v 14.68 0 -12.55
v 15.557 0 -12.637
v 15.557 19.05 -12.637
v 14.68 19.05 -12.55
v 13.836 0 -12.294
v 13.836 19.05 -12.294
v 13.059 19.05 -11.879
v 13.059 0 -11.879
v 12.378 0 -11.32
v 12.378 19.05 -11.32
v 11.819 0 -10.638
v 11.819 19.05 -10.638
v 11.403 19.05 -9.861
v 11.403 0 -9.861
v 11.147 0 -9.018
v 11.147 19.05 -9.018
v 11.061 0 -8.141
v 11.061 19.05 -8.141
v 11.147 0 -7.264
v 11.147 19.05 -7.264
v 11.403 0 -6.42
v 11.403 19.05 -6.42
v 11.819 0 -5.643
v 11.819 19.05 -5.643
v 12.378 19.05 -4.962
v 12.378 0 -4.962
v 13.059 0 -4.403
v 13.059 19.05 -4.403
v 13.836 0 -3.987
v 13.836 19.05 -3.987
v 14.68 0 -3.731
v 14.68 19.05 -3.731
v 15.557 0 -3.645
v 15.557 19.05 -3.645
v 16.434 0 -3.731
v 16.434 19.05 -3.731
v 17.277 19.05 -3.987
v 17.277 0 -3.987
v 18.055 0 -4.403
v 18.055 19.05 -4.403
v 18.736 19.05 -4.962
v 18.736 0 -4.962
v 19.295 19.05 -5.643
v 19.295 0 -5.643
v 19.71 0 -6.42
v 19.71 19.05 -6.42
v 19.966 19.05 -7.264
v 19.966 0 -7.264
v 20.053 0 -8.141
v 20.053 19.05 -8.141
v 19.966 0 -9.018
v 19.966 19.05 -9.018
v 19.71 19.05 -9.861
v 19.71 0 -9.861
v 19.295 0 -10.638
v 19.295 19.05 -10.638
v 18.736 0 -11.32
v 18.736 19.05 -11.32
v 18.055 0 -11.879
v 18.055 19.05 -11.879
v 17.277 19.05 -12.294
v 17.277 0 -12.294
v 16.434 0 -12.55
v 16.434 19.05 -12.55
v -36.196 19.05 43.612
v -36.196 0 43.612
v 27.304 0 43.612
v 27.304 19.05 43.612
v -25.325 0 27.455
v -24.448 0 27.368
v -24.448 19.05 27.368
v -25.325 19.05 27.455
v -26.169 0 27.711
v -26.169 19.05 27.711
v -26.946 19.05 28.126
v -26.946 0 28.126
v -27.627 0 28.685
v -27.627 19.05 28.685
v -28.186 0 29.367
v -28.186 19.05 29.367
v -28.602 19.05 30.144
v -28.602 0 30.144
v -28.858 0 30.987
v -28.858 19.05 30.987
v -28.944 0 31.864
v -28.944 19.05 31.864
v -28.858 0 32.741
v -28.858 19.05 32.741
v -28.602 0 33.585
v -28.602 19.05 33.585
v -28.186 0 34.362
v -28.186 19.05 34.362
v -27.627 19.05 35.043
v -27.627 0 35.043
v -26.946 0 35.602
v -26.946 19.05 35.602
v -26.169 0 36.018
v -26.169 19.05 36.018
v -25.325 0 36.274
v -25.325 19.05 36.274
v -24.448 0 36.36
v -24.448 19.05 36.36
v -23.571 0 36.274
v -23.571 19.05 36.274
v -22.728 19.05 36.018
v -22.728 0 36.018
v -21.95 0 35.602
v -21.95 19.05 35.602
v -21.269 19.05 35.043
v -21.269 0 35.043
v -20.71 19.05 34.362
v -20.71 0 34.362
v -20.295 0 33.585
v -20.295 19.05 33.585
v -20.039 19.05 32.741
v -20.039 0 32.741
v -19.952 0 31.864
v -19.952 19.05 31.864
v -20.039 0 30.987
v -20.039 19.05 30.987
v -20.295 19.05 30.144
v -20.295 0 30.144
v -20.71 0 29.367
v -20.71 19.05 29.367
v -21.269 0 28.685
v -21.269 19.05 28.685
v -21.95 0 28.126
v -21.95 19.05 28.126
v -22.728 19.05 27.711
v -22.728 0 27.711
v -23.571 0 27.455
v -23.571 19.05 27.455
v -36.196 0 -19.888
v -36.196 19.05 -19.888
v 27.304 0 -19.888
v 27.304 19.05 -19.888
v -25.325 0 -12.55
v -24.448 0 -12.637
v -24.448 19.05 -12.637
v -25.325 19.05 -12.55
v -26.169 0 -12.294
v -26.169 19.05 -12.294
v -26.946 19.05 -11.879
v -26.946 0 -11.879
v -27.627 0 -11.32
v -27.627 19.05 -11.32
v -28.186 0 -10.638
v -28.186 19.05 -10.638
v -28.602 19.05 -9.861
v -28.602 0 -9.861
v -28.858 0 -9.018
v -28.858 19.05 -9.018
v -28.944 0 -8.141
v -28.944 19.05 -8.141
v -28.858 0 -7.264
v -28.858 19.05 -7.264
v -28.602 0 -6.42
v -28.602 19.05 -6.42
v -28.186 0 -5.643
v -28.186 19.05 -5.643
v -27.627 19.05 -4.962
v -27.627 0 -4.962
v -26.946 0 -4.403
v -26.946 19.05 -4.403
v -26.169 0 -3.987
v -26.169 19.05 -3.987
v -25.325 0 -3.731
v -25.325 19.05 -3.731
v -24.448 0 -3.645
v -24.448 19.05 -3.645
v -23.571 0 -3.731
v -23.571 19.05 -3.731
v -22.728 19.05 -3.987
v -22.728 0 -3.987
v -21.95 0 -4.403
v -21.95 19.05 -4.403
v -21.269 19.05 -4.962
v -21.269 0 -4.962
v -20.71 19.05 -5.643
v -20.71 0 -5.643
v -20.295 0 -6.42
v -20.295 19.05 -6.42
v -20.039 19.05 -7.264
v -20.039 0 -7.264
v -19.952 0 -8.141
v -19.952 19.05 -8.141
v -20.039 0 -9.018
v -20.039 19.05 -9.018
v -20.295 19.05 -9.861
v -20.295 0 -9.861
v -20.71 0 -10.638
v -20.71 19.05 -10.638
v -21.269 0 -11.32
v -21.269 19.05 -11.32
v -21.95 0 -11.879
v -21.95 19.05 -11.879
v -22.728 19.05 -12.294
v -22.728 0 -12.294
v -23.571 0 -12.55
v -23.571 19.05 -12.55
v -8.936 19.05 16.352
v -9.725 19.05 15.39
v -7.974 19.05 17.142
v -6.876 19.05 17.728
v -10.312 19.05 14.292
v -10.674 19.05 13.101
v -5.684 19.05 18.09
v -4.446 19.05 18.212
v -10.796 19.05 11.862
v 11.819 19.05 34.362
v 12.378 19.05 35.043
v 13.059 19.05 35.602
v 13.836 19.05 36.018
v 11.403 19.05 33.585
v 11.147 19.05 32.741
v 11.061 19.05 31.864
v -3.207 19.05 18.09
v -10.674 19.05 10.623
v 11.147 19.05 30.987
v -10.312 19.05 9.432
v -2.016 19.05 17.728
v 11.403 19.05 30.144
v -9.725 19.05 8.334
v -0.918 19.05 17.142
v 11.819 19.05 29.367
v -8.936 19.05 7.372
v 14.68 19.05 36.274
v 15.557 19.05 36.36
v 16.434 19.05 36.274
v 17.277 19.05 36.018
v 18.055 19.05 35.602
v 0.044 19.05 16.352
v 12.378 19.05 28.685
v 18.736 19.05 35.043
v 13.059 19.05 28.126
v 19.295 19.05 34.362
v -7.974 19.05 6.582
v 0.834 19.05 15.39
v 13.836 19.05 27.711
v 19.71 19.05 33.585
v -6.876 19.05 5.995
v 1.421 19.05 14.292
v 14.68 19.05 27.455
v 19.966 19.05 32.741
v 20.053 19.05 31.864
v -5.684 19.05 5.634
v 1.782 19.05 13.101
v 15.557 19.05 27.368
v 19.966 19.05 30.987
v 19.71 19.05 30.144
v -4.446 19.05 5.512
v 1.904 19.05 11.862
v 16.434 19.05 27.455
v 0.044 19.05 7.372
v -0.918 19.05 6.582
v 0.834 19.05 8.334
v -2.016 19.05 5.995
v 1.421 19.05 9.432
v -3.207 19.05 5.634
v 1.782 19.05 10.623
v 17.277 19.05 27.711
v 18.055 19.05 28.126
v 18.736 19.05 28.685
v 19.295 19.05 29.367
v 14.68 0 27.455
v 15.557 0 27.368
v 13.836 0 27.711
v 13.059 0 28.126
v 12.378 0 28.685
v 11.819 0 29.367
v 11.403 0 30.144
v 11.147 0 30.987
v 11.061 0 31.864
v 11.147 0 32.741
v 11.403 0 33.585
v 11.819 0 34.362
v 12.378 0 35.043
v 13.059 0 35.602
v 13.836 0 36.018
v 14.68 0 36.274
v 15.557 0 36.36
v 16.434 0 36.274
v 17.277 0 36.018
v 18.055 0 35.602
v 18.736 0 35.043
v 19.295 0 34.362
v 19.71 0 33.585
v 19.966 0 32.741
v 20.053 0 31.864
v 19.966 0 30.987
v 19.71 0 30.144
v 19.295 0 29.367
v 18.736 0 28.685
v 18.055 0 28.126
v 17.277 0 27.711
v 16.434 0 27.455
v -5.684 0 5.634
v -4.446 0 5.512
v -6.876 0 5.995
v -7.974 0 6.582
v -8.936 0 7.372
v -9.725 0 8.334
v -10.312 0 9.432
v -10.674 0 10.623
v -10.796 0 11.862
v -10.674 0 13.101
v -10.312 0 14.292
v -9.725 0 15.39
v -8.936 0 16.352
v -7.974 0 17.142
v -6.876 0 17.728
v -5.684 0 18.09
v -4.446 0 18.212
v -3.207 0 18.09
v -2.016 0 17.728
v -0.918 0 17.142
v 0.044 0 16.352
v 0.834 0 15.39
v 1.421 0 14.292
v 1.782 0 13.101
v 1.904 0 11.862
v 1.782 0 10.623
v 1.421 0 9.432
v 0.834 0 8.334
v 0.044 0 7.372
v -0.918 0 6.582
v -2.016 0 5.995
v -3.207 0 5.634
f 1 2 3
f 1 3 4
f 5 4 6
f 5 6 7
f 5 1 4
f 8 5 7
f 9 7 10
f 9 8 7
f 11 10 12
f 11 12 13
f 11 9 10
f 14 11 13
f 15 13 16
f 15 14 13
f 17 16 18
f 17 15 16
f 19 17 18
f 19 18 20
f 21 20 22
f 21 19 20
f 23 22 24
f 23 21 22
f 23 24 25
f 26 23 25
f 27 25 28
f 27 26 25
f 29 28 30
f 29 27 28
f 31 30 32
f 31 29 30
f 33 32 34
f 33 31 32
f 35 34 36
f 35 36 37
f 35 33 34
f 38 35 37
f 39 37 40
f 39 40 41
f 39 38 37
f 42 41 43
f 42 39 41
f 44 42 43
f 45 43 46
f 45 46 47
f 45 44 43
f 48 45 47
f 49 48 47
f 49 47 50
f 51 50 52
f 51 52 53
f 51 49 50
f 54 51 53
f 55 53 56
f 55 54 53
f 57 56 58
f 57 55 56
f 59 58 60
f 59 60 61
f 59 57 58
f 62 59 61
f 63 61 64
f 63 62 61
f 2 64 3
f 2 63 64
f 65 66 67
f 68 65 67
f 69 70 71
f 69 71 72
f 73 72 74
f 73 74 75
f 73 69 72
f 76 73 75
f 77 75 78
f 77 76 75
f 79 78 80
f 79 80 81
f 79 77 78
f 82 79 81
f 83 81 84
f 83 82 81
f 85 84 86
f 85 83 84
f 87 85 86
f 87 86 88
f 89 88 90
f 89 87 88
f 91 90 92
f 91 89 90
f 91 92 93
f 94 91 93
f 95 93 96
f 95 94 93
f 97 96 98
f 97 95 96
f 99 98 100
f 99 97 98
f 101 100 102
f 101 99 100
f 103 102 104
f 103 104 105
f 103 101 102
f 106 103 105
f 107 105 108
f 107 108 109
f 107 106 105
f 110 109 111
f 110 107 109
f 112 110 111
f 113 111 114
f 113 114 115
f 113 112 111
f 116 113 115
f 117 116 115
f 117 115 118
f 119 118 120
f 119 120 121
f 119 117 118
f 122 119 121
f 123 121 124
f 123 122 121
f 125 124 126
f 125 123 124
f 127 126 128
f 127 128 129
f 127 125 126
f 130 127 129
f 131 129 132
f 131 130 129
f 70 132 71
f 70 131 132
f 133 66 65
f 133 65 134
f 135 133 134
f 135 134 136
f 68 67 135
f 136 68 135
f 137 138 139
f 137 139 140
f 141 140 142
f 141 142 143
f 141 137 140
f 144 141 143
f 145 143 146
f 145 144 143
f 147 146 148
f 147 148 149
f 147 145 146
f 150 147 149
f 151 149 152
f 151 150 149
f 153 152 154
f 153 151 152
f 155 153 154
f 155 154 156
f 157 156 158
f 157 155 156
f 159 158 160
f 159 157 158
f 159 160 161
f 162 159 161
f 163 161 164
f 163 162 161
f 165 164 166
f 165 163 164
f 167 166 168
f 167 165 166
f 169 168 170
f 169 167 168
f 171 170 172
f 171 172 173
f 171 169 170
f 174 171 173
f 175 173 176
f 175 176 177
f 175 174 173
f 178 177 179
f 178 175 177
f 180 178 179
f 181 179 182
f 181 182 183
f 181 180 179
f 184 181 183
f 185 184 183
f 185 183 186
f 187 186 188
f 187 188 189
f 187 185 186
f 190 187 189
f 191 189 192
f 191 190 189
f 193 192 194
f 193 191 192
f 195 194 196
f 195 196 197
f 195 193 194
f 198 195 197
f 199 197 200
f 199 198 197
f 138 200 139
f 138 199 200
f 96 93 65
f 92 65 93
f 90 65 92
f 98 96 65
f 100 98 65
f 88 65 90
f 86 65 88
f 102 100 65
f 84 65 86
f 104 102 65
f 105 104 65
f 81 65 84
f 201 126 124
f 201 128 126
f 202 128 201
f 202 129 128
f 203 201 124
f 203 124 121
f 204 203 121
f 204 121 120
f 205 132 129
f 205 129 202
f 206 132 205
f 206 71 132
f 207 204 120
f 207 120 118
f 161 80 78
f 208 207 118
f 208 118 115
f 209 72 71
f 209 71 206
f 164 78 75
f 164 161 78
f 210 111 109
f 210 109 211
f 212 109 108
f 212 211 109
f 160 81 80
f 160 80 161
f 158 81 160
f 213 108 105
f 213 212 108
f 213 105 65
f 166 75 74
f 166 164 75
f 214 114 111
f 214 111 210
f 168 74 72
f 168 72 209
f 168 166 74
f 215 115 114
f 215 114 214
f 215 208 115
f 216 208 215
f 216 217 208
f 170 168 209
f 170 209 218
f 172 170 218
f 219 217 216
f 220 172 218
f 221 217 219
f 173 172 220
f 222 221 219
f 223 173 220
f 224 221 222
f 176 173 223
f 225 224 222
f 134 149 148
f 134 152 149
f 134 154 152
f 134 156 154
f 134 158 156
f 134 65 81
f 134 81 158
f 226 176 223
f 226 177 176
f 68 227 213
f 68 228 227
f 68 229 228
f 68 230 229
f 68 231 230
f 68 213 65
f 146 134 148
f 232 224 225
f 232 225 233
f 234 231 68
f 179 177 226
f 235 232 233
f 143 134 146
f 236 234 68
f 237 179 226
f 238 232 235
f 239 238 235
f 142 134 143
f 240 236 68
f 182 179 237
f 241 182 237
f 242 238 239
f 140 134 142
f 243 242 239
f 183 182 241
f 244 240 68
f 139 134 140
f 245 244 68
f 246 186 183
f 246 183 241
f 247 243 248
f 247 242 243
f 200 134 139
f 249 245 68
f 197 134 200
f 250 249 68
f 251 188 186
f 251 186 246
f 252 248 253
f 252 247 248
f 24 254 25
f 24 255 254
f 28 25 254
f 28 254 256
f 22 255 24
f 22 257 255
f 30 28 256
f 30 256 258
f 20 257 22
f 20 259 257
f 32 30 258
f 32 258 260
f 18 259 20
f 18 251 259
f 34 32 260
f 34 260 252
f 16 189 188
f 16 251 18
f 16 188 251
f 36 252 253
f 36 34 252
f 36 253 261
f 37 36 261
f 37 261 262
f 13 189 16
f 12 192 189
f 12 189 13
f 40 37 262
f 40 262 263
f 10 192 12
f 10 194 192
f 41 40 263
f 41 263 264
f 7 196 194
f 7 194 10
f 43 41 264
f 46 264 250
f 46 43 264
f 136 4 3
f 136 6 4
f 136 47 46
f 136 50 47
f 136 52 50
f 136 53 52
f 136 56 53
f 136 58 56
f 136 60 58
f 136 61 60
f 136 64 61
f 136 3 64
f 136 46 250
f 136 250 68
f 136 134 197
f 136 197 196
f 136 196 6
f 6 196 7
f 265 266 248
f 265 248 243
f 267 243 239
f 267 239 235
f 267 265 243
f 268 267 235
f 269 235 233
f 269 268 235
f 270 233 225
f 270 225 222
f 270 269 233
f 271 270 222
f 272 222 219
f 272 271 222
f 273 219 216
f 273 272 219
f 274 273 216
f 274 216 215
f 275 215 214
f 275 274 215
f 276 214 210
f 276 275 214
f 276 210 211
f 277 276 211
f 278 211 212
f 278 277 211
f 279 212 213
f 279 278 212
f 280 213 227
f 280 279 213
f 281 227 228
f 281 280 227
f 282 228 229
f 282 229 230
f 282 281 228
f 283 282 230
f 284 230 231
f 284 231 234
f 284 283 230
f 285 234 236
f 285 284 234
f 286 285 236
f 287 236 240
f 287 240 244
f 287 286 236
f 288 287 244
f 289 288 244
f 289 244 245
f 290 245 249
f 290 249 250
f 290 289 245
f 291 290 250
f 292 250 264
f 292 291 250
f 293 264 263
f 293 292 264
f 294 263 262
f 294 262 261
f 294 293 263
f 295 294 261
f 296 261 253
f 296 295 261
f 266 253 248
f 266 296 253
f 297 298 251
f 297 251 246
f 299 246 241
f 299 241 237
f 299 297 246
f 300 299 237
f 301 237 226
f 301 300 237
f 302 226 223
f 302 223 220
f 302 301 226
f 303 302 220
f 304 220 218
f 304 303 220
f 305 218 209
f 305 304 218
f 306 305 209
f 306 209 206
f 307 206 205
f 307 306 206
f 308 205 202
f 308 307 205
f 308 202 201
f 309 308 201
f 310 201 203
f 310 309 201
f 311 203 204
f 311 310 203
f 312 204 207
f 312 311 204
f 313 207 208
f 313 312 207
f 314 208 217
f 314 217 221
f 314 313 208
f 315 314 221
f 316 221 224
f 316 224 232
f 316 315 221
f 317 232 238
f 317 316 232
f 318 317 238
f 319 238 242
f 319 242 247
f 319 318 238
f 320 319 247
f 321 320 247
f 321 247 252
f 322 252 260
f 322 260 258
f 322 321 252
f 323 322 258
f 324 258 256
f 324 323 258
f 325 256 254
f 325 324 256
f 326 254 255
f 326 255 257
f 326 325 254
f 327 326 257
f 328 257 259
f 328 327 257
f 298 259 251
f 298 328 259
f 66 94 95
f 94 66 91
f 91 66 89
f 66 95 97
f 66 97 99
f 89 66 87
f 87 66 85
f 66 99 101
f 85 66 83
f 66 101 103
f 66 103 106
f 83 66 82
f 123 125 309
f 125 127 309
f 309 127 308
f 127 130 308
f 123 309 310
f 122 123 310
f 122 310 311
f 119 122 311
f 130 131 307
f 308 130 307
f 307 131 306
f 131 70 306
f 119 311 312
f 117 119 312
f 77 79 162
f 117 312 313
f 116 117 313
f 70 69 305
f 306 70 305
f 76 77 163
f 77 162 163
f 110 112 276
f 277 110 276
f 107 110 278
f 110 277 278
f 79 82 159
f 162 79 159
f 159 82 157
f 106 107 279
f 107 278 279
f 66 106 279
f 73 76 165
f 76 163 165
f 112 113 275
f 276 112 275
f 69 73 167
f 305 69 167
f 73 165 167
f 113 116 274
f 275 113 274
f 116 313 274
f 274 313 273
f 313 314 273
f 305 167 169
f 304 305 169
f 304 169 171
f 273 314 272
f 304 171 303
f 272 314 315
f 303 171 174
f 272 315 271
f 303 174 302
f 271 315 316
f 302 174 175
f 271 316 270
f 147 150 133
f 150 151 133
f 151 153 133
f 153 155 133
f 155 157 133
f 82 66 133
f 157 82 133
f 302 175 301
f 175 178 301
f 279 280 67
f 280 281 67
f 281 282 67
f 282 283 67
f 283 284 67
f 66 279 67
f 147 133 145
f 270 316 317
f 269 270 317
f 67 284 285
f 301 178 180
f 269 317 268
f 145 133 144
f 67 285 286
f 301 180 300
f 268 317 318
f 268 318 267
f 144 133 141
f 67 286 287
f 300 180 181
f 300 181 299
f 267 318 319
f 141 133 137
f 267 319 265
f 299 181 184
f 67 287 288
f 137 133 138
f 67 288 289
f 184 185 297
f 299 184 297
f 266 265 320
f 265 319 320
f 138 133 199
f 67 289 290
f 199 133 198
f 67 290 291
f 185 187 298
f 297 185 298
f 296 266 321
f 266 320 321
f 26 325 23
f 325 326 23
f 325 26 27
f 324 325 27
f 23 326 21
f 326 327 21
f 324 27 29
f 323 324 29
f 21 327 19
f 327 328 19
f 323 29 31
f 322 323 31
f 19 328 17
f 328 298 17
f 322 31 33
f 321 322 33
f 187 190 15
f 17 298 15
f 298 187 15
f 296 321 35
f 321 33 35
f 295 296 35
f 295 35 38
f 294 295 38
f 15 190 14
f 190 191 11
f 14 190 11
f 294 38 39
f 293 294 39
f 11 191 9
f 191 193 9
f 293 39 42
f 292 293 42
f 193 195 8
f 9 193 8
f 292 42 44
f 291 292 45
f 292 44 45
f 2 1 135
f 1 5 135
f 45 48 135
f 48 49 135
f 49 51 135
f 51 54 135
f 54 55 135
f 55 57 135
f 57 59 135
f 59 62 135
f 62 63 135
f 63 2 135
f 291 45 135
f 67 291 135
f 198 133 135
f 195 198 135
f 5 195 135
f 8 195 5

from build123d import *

# Parameters (mm, degrees)
SKETCH1_W           = 63.5
SKETCH1_H           = 63.5
SKETCH1_R           = 6.35
BOSS_EXTRUDE1_DEPTH = 19.05
SKETCH3_R           = 4.4958
CUT_EXTRUDE2_DEPTH  = 19.05


with BuildPart() as part:
    # Sketch1 → Boss-Extrude1 (new body)
    with BuildSketch(Plane(origin=(0, 0, 0), x_dir=(1, 0, 0), z_dir=(0, 1, 0))):
        with Locations((-4.445666472, -11.8618)):
            Rectangle(SKETCH1_W, SKETCH1_H)
        with Locations(Location((-4.445666472, -11.8618, 0), (0, 0, 90))):
            Circle(SKETCH1_R, mode=Mode.SUBTRACT)
    extrude(amount=BOSS_EXTRUDE1_DEPTH)

    # Sketch3 → Cut-Extrude2 (cut)
    with BuildSketch(Plane(origin=(0, 0, 0), x_dir=(1, 0, 0), z_dir=(0, 1, 0))):
        with Locations(Location((-24.448166472, 8.1407, 0), (0, 0, 90))):
            Circle(SKETCH3_R)
        with Locations(Location((15.556833528, 8.1407, 0), (0, 0, 90))):
            Circle(SKETCH3_R)
        with Locations(Location((15.556833528, -31.8643, 0), (0, 0, 90))):
            Circle(SKETCH3_R)
        with Locations(Location((-24.448166472, -31.8643, 0), (0, 0, 90))):
            Circle(SKETCH3_R)
    extrude(amount=CUT_EXTRUDE2_DEPTH, mode=Mode.SUBTRACT)


solid = part.part
